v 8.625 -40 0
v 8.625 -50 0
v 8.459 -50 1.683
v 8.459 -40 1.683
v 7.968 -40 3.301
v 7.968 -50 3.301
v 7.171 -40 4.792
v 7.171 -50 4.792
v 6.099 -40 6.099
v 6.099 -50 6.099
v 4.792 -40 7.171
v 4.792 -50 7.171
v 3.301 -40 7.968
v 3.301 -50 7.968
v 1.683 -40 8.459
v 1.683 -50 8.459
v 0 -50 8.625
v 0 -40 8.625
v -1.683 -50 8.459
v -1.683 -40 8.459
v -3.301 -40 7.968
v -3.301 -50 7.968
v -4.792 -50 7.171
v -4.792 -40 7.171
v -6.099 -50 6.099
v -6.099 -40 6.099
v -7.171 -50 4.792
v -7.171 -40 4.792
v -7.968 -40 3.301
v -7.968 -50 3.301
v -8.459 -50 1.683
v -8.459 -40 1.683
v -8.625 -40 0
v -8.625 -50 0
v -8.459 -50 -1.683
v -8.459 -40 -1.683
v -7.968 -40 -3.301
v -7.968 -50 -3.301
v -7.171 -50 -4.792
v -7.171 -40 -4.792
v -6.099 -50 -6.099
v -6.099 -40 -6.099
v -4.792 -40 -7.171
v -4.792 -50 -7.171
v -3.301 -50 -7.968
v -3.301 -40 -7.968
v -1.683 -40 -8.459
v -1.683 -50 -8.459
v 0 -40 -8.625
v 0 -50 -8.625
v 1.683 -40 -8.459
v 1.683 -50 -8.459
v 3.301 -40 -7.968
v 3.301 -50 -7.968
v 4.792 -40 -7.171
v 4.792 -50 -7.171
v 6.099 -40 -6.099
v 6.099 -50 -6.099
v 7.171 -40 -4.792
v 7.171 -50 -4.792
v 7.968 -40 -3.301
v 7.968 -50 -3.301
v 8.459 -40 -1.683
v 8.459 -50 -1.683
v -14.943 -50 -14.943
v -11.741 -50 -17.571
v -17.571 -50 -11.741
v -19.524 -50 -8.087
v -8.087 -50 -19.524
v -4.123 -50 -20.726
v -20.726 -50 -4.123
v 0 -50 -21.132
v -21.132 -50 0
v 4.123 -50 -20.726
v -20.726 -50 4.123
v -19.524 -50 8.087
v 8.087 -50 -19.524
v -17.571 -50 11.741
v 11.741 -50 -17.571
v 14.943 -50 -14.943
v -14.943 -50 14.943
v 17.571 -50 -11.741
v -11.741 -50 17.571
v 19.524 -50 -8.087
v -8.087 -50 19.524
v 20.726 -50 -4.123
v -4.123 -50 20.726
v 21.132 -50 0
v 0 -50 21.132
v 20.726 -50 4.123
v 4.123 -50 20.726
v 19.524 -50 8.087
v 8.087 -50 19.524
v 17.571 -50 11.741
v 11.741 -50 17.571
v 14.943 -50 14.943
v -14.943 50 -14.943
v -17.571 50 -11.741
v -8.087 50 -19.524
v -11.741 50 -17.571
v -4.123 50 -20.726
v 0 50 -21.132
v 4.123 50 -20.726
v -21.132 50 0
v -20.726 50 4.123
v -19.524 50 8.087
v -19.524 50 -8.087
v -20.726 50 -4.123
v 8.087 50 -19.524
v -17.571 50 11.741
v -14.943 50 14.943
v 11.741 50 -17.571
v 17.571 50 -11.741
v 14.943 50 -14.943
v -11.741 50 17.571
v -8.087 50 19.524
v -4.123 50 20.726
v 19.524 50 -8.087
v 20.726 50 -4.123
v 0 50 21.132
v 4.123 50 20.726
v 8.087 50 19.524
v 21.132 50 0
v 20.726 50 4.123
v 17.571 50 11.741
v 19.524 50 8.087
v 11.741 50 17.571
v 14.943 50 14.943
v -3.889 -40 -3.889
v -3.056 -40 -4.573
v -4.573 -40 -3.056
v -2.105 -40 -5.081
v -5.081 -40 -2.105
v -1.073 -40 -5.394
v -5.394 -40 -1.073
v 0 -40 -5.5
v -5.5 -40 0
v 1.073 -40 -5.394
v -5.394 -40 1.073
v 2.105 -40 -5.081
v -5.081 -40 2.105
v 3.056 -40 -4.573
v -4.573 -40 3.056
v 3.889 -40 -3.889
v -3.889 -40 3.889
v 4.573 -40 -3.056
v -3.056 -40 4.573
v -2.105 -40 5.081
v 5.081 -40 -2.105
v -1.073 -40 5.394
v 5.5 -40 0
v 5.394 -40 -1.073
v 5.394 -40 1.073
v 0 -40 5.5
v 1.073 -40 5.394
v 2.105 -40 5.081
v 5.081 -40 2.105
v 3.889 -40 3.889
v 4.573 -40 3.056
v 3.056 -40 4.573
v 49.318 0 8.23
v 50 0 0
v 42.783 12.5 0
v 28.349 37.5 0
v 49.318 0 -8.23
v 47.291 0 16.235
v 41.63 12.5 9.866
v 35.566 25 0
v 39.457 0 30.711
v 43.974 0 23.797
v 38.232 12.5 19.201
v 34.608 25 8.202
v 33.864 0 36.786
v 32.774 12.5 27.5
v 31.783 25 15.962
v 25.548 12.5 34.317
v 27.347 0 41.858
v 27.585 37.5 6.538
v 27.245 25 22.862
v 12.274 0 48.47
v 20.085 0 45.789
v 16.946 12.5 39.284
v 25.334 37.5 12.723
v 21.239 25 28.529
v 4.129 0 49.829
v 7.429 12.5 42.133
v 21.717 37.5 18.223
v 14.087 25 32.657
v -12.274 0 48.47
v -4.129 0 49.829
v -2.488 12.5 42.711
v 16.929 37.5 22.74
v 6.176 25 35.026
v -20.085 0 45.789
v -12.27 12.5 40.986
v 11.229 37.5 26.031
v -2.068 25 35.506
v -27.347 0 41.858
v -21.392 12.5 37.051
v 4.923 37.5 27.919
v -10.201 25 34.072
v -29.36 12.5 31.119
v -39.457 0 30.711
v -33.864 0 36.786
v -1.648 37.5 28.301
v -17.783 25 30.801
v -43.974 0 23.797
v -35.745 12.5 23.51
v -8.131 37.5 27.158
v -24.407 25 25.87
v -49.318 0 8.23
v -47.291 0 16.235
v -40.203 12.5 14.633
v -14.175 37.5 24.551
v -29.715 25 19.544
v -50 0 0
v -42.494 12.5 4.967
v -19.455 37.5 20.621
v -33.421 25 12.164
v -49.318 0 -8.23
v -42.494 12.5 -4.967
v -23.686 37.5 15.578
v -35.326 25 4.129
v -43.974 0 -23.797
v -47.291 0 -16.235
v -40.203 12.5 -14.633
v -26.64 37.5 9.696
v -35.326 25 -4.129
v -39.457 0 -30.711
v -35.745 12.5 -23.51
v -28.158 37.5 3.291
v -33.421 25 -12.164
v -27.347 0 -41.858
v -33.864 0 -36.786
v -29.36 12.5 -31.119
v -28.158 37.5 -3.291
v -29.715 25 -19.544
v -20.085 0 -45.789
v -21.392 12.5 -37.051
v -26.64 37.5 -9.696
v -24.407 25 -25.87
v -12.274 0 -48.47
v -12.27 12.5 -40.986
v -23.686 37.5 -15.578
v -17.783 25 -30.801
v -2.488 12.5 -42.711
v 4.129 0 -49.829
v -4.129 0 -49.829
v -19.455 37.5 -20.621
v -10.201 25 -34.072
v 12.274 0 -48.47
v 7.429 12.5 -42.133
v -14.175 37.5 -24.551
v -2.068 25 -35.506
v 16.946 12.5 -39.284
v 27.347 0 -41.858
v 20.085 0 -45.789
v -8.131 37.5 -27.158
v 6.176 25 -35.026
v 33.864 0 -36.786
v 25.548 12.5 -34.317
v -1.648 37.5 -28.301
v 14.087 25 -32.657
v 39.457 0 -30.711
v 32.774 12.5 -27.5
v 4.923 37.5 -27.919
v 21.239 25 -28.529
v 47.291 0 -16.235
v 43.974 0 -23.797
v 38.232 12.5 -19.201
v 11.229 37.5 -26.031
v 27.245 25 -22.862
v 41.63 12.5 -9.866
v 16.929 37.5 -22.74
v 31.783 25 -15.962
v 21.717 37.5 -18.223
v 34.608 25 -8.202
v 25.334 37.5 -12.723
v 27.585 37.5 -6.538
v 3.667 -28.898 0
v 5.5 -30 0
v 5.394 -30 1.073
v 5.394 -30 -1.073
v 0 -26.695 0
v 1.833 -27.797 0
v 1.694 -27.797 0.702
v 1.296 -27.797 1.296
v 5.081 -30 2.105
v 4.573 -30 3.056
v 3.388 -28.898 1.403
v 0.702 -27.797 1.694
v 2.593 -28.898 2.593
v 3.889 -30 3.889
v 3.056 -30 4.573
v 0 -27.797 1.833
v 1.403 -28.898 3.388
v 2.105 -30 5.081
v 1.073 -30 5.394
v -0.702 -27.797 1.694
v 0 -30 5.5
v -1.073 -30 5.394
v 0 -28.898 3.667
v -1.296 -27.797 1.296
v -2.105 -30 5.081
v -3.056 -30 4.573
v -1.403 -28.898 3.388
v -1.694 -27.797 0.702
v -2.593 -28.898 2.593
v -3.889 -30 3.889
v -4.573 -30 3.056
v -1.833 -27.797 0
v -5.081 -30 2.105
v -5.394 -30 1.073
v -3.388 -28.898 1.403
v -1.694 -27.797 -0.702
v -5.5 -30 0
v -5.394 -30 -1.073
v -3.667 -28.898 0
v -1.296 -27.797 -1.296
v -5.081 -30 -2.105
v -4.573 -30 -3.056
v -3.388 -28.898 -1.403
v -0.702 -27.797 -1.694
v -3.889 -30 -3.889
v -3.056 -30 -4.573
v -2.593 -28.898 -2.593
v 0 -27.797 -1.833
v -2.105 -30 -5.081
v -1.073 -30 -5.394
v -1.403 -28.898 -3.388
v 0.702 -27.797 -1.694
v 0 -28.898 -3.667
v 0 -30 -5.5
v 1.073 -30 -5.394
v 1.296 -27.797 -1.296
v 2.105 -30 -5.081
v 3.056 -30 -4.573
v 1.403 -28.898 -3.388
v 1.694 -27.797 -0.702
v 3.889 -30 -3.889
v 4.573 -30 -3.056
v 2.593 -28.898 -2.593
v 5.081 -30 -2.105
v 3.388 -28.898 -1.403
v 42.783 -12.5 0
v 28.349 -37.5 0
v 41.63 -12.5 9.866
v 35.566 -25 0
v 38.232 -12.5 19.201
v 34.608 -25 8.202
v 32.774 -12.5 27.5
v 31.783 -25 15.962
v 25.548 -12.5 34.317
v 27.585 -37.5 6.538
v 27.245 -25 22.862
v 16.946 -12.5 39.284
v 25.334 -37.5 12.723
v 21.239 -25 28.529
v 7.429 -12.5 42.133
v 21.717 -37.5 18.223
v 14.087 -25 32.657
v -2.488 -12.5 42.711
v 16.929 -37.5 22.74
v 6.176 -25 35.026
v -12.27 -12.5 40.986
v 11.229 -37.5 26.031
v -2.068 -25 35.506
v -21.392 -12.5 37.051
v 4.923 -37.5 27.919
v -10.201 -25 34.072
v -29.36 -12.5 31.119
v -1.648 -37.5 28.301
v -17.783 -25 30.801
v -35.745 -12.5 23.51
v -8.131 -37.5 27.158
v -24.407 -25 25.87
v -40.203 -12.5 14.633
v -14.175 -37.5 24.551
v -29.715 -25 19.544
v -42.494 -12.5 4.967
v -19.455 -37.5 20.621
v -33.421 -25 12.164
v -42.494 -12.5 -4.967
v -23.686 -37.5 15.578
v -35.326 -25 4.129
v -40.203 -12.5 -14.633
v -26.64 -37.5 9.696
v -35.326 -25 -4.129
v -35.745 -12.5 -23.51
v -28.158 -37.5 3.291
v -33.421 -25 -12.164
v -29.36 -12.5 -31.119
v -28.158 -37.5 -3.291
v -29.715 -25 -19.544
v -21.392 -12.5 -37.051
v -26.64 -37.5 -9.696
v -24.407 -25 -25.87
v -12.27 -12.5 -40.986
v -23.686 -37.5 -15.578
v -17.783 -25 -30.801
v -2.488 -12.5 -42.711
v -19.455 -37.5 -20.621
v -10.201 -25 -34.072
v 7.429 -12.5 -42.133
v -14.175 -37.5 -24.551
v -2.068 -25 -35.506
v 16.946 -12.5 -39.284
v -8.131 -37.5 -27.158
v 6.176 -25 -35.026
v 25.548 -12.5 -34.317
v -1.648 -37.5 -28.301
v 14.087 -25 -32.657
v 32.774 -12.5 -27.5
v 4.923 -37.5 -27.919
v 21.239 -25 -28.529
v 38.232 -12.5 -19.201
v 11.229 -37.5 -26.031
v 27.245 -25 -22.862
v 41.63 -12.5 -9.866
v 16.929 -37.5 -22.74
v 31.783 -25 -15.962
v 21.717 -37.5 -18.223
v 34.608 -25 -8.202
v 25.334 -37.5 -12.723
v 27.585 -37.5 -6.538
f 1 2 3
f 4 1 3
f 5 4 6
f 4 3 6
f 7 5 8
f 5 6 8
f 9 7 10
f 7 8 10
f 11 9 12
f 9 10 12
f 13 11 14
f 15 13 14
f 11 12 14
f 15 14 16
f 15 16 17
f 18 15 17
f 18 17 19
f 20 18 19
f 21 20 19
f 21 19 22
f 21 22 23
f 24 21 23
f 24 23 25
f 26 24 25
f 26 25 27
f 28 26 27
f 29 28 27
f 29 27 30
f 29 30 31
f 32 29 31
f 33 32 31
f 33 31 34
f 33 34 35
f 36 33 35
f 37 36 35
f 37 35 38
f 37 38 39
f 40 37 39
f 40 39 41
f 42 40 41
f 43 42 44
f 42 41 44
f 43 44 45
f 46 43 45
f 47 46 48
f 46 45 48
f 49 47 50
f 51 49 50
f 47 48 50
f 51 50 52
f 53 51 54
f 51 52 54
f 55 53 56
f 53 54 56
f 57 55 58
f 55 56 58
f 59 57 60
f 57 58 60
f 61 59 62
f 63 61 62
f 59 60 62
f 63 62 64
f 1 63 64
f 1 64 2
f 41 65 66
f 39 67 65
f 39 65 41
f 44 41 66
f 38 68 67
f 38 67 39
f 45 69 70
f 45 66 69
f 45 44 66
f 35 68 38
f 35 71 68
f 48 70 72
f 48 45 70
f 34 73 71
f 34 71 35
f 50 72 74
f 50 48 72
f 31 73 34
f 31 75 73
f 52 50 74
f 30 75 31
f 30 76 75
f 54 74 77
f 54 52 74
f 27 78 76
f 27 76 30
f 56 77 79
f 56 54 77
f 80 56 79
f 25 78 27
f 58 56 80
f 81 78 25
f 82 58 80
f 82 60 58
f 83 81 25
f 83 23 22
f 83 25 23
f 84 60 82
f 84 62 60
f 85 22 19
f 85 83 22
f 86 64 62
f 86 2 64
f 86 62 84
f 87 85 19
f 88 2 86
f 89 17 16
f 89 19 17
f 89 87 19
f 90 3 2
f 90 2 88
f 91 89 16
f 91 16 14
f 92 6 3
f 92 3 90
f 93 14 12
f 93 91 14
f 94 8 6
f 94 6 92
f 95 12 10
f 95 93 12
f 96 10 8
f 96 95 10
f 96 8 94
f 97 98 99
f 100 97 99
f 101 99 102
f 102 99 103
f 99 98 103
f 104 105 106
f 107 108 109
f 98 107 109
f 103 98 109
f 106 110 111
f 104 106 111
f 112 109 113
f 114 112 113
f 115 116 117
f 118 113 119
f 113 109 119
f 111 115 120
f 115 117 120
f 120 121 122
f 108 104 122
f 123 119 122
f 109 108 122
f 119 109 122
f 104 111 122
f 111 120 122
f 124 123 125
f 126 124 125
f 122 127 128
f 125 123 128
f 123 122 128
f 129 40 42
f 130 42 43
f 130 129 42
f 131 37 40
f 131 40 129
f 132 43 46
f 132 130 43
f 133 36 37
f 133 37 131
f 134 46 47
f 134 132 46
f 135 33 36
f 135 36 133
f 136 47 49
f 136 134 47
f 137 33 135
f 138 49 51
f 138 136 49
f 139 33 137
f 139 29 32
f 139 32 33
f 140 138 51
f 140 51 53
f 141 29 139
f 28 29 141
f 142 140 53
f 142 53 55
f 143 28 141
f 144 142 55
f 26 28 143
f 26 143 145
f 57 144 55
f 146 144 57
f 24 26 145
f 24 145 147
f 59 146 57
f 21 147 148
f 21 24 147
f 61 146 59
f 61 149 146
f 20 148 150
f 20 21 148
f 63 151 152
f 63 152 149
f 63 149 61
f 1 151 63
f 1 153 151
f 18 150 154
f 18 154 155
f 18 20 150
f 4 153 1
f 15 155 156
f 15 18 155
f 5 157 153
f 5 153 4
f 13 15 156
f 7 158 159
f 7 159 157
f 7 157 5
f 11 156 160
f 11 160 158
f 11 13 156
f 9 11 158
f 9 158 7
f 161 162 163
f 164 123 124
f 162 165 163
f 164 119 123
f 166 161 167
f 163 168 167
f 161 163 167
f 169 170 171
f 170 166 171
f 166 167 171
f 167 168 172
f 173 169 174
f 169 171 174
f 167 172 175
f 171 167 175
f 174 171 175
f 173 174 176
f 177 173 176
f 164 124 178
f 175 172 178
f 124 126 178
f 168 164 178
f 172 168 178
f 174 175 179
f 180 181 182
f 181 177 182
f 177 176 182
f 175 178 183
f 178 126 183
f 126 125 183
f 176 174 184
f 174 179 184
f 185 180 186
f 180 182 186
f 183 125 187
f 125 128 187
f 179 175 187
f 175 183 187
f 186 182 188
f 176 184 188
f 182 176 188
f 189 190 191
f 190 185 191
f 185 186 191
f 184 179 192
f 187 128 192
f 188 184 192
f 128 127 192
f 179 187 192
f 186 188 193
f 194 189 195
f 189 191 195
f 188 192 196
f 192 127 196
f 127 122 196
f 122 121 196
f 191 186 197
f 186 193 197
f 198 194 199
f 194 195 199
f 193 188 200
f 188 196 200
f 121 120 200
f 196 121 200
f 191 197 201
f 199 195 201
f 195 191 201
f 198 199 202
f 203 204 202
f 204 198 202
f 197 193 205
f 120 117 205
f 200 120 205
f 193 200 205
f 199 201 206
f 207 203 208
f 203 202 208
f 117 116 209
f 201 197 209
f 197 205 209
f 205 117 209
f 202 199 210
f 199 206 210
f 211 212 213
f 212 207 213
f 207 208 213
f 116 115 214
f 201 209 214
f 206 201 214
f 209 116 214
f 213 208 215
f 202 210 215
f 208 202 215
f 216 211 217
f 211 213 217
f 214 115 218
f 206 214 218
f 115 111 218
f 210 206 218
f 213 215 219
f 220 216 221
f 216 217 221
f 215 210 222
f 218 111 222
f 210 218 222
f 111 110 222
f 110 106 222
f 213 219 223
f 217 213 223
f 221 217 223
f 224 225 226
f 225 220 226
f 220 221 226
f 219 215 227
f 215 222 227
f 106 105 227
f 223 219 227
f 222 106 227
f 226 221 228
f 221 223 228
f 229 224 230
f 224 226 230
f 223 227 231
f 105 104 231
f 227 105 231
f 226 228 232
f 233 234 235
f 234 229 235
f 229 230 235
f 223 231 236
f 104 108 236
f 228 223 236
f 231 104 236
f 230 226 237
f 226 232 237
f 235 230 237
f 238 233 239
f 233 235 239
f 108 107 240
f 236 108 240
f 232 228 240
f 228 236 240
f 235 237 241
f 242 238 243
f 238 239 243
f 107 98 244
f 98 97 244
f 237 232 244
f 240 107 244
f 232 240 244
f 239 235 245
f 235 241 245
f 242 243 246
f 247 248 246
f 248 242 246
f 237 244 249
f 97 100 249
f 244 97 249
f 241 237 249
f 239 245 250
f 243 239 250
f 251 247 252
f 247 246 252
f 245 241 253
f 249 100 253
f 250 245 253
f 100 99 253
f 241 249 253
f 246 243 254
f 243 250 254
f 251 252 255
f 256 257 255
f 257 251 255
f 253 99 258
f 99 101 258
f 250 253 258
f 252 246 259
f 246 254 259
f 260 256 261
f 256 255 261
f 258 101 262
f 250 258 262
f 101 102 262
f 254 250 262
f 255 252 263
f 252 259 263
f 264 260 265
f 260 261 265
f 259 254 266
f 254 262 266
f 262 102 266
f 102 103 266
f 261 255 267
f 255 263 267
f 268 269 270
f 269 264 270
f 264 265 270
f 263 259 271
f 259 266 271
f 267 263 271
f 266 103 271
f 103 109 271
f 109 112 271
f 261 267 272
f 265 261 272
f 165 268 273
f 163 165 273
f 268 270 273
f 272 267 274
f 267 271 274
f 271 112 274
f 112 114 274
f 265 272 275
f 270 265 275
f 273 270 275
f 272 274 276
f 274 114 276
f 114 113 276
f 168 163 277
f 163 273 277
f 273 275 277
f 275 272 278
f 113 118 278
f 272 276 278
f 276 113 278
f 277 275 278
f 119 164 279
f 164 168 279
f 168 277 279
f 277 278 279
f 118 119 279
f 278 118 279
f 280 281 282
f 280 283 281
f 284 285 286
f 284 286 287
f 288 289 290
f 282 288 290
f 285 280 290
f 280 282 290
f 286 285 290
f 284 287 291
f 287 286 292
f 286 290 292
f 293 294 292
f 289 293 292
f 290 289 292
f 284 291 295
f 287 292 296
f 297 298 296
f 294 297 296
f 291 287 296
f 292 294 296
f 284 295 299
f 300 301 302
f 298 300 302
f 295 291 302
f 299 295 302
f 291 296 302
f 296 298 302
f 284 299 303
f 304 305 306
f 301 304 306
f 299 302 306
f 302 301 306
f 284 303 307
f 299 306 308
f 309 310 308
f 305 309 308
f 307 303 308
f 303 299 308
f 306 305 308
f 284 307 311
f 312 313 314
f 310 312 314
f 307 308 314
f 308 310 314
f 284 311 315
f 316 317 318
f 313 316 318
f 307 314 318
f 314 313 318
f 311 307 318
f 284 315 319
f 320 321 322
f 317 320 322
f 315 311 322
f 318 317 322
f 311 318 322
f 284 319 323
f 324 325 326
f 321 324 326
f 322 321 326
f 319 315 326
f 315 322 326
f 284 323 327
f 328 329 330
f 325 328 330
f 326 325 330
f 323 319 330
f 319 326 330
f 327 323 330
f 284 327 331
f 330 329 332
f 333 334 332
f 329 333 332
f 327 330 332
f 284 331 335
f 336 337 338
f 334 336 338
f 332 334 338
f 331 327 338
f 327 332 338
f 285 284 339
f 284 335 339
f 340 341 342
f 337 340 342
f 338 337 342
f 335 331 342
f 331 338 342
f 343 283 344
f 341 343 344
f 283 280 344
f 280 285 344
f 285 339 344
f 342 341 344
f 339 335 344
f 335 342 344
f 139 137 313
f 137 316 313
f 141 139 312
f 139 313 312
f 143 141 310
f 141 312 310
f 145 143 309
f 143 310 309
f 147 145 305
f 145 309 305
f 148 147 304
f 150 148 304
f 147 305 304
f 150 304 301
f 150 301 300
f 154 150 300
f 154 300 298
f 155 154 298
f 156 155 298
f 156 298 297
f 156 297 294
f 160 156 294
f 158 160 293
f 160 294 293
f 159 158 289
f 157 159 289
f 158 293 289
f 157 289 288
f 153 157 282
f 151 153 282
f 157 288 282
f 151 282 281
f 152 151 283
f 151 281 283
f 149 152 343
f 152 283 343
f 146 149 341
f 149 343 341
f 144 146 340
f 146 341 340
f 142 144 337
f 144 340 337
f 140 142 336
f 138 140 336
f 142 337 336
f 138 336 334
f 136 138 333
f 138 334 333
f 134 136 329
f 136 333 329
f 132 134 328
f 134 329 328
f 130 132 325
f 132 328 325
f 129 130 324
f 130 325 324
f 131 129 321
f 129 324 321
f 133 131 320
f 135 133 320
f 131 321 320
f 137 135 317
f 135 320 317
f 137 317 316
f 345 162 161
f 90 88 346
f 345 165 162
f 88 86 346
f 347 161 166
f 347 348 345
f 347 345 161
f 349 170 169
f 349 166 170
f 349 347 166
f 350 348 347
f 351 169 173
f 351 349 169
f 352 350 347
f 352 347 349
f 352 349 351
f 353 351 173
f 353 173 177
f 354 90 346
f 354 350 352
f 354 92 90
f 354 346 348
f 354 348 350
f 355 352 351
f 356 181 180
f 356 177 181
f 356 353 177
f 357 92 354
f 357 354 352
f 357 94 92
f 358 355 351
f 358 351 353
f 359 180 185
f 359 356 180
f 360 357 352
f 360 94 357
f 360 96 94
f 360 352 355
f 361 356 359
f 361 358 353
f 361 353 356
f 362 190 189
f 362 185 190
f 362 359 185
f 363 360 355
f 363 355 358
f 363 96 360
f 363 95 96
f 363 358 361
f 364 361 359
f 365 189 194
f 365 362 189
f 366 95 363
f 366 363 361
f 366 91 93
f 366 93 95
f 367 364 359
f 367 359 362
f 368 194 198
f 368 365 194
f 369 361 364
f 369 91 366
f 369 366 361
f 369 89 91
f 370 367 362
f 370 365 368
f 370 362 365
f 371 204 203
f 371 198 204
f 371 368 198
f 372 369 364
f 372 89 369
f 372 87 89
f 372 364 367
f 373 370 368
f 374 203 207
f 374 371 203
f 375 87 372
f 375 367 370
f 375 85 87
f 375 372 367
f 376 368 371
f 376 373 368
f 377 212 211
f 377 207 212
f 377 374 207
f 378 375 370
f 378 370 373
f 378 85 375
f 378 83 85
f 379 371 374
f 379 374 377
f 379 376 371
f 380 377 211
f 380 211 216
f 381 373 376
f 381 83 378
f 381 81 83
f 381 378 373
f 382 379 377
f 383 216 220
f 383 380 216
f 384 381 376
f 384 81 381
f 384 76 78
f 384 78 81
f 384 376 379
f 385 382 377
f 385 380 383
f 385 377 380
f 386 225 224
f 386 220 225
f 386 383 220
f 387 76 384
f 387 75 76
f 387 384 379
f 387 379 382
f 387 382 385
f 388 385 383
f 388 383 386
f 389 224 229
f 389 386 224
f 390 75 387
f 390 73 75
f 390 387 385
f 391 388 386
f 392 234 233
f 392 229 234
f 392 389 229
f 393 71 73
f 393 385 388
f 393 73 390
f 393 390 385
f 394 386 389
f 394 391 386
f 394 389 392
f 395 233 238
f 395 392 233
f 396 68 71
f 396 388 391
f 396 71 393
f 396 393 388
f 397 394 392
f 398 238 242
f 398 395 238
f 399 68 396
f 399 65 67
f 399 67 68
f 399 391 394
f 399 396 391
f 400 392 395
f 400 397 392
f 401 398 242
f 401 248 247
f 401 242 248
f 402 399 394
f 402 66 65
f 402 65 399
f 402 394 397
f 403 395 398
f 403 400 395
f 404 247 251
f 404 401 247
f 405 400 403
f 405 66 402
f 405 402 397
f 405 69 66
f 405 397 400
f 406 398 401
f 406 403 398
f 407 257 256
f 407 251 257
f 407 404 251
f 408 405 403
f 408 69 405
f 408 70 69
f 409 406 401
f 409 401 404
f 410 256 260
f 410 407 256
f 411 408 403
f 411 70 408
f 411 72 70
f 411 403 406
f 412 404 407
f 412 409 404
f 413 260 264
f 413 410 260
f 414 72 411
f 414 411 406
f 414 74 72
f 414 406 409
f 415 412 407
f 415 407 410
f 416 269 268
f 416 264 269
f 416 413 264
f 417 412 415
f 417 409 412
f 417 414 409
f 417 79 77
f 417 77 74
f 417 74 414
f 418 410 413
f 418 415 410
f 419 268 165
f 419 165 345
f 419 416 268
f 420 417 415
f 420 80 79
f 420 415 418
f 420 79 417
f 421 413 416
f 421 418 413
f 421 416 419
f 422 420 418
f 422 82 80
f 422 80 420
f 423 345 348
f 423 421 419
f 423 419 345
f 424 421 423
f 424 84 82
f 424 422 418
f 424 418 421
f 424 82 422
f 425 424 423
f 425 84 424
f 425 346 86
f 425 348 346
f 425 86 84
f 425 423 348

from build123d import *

# Parameters (mm, degrees)
F0_R           = 50
F1_DEPTH       = 50
F1_TAPER       = 30
F3_D           = 11
F3_DEPTH       = 20
F3_CBORE_D     = 17.25
F3_CBORE_DEPTH = 10
F3_TIP         = 3.3047334047


with BuildPart() as f1:
    # F0 (on Front) → F1 (new body, symmetric)
    with BuildSketch(Plane.XZ):
        Circle(F0_R)
    extrude(amount=F1_DEPTH, both=True, taper=F1_TAPER)

    # F3
    with Locations(Plane.XZ.offset(50)):
        with Locations((0, 0)):
            CounterBoreHole(F3_D / 2, F3_CBORE_D / 2, F3_CBORE_DEPTH, depth=F3_DEPTH)
            with Locations((0, 0, -(F3_DEPTH + F3_TIP / 2))):  # 118° drill point
                Cone(0, F3_D / 2, F3_TIP, mode=Mode.SUBTRACT)


solid = f1.part
